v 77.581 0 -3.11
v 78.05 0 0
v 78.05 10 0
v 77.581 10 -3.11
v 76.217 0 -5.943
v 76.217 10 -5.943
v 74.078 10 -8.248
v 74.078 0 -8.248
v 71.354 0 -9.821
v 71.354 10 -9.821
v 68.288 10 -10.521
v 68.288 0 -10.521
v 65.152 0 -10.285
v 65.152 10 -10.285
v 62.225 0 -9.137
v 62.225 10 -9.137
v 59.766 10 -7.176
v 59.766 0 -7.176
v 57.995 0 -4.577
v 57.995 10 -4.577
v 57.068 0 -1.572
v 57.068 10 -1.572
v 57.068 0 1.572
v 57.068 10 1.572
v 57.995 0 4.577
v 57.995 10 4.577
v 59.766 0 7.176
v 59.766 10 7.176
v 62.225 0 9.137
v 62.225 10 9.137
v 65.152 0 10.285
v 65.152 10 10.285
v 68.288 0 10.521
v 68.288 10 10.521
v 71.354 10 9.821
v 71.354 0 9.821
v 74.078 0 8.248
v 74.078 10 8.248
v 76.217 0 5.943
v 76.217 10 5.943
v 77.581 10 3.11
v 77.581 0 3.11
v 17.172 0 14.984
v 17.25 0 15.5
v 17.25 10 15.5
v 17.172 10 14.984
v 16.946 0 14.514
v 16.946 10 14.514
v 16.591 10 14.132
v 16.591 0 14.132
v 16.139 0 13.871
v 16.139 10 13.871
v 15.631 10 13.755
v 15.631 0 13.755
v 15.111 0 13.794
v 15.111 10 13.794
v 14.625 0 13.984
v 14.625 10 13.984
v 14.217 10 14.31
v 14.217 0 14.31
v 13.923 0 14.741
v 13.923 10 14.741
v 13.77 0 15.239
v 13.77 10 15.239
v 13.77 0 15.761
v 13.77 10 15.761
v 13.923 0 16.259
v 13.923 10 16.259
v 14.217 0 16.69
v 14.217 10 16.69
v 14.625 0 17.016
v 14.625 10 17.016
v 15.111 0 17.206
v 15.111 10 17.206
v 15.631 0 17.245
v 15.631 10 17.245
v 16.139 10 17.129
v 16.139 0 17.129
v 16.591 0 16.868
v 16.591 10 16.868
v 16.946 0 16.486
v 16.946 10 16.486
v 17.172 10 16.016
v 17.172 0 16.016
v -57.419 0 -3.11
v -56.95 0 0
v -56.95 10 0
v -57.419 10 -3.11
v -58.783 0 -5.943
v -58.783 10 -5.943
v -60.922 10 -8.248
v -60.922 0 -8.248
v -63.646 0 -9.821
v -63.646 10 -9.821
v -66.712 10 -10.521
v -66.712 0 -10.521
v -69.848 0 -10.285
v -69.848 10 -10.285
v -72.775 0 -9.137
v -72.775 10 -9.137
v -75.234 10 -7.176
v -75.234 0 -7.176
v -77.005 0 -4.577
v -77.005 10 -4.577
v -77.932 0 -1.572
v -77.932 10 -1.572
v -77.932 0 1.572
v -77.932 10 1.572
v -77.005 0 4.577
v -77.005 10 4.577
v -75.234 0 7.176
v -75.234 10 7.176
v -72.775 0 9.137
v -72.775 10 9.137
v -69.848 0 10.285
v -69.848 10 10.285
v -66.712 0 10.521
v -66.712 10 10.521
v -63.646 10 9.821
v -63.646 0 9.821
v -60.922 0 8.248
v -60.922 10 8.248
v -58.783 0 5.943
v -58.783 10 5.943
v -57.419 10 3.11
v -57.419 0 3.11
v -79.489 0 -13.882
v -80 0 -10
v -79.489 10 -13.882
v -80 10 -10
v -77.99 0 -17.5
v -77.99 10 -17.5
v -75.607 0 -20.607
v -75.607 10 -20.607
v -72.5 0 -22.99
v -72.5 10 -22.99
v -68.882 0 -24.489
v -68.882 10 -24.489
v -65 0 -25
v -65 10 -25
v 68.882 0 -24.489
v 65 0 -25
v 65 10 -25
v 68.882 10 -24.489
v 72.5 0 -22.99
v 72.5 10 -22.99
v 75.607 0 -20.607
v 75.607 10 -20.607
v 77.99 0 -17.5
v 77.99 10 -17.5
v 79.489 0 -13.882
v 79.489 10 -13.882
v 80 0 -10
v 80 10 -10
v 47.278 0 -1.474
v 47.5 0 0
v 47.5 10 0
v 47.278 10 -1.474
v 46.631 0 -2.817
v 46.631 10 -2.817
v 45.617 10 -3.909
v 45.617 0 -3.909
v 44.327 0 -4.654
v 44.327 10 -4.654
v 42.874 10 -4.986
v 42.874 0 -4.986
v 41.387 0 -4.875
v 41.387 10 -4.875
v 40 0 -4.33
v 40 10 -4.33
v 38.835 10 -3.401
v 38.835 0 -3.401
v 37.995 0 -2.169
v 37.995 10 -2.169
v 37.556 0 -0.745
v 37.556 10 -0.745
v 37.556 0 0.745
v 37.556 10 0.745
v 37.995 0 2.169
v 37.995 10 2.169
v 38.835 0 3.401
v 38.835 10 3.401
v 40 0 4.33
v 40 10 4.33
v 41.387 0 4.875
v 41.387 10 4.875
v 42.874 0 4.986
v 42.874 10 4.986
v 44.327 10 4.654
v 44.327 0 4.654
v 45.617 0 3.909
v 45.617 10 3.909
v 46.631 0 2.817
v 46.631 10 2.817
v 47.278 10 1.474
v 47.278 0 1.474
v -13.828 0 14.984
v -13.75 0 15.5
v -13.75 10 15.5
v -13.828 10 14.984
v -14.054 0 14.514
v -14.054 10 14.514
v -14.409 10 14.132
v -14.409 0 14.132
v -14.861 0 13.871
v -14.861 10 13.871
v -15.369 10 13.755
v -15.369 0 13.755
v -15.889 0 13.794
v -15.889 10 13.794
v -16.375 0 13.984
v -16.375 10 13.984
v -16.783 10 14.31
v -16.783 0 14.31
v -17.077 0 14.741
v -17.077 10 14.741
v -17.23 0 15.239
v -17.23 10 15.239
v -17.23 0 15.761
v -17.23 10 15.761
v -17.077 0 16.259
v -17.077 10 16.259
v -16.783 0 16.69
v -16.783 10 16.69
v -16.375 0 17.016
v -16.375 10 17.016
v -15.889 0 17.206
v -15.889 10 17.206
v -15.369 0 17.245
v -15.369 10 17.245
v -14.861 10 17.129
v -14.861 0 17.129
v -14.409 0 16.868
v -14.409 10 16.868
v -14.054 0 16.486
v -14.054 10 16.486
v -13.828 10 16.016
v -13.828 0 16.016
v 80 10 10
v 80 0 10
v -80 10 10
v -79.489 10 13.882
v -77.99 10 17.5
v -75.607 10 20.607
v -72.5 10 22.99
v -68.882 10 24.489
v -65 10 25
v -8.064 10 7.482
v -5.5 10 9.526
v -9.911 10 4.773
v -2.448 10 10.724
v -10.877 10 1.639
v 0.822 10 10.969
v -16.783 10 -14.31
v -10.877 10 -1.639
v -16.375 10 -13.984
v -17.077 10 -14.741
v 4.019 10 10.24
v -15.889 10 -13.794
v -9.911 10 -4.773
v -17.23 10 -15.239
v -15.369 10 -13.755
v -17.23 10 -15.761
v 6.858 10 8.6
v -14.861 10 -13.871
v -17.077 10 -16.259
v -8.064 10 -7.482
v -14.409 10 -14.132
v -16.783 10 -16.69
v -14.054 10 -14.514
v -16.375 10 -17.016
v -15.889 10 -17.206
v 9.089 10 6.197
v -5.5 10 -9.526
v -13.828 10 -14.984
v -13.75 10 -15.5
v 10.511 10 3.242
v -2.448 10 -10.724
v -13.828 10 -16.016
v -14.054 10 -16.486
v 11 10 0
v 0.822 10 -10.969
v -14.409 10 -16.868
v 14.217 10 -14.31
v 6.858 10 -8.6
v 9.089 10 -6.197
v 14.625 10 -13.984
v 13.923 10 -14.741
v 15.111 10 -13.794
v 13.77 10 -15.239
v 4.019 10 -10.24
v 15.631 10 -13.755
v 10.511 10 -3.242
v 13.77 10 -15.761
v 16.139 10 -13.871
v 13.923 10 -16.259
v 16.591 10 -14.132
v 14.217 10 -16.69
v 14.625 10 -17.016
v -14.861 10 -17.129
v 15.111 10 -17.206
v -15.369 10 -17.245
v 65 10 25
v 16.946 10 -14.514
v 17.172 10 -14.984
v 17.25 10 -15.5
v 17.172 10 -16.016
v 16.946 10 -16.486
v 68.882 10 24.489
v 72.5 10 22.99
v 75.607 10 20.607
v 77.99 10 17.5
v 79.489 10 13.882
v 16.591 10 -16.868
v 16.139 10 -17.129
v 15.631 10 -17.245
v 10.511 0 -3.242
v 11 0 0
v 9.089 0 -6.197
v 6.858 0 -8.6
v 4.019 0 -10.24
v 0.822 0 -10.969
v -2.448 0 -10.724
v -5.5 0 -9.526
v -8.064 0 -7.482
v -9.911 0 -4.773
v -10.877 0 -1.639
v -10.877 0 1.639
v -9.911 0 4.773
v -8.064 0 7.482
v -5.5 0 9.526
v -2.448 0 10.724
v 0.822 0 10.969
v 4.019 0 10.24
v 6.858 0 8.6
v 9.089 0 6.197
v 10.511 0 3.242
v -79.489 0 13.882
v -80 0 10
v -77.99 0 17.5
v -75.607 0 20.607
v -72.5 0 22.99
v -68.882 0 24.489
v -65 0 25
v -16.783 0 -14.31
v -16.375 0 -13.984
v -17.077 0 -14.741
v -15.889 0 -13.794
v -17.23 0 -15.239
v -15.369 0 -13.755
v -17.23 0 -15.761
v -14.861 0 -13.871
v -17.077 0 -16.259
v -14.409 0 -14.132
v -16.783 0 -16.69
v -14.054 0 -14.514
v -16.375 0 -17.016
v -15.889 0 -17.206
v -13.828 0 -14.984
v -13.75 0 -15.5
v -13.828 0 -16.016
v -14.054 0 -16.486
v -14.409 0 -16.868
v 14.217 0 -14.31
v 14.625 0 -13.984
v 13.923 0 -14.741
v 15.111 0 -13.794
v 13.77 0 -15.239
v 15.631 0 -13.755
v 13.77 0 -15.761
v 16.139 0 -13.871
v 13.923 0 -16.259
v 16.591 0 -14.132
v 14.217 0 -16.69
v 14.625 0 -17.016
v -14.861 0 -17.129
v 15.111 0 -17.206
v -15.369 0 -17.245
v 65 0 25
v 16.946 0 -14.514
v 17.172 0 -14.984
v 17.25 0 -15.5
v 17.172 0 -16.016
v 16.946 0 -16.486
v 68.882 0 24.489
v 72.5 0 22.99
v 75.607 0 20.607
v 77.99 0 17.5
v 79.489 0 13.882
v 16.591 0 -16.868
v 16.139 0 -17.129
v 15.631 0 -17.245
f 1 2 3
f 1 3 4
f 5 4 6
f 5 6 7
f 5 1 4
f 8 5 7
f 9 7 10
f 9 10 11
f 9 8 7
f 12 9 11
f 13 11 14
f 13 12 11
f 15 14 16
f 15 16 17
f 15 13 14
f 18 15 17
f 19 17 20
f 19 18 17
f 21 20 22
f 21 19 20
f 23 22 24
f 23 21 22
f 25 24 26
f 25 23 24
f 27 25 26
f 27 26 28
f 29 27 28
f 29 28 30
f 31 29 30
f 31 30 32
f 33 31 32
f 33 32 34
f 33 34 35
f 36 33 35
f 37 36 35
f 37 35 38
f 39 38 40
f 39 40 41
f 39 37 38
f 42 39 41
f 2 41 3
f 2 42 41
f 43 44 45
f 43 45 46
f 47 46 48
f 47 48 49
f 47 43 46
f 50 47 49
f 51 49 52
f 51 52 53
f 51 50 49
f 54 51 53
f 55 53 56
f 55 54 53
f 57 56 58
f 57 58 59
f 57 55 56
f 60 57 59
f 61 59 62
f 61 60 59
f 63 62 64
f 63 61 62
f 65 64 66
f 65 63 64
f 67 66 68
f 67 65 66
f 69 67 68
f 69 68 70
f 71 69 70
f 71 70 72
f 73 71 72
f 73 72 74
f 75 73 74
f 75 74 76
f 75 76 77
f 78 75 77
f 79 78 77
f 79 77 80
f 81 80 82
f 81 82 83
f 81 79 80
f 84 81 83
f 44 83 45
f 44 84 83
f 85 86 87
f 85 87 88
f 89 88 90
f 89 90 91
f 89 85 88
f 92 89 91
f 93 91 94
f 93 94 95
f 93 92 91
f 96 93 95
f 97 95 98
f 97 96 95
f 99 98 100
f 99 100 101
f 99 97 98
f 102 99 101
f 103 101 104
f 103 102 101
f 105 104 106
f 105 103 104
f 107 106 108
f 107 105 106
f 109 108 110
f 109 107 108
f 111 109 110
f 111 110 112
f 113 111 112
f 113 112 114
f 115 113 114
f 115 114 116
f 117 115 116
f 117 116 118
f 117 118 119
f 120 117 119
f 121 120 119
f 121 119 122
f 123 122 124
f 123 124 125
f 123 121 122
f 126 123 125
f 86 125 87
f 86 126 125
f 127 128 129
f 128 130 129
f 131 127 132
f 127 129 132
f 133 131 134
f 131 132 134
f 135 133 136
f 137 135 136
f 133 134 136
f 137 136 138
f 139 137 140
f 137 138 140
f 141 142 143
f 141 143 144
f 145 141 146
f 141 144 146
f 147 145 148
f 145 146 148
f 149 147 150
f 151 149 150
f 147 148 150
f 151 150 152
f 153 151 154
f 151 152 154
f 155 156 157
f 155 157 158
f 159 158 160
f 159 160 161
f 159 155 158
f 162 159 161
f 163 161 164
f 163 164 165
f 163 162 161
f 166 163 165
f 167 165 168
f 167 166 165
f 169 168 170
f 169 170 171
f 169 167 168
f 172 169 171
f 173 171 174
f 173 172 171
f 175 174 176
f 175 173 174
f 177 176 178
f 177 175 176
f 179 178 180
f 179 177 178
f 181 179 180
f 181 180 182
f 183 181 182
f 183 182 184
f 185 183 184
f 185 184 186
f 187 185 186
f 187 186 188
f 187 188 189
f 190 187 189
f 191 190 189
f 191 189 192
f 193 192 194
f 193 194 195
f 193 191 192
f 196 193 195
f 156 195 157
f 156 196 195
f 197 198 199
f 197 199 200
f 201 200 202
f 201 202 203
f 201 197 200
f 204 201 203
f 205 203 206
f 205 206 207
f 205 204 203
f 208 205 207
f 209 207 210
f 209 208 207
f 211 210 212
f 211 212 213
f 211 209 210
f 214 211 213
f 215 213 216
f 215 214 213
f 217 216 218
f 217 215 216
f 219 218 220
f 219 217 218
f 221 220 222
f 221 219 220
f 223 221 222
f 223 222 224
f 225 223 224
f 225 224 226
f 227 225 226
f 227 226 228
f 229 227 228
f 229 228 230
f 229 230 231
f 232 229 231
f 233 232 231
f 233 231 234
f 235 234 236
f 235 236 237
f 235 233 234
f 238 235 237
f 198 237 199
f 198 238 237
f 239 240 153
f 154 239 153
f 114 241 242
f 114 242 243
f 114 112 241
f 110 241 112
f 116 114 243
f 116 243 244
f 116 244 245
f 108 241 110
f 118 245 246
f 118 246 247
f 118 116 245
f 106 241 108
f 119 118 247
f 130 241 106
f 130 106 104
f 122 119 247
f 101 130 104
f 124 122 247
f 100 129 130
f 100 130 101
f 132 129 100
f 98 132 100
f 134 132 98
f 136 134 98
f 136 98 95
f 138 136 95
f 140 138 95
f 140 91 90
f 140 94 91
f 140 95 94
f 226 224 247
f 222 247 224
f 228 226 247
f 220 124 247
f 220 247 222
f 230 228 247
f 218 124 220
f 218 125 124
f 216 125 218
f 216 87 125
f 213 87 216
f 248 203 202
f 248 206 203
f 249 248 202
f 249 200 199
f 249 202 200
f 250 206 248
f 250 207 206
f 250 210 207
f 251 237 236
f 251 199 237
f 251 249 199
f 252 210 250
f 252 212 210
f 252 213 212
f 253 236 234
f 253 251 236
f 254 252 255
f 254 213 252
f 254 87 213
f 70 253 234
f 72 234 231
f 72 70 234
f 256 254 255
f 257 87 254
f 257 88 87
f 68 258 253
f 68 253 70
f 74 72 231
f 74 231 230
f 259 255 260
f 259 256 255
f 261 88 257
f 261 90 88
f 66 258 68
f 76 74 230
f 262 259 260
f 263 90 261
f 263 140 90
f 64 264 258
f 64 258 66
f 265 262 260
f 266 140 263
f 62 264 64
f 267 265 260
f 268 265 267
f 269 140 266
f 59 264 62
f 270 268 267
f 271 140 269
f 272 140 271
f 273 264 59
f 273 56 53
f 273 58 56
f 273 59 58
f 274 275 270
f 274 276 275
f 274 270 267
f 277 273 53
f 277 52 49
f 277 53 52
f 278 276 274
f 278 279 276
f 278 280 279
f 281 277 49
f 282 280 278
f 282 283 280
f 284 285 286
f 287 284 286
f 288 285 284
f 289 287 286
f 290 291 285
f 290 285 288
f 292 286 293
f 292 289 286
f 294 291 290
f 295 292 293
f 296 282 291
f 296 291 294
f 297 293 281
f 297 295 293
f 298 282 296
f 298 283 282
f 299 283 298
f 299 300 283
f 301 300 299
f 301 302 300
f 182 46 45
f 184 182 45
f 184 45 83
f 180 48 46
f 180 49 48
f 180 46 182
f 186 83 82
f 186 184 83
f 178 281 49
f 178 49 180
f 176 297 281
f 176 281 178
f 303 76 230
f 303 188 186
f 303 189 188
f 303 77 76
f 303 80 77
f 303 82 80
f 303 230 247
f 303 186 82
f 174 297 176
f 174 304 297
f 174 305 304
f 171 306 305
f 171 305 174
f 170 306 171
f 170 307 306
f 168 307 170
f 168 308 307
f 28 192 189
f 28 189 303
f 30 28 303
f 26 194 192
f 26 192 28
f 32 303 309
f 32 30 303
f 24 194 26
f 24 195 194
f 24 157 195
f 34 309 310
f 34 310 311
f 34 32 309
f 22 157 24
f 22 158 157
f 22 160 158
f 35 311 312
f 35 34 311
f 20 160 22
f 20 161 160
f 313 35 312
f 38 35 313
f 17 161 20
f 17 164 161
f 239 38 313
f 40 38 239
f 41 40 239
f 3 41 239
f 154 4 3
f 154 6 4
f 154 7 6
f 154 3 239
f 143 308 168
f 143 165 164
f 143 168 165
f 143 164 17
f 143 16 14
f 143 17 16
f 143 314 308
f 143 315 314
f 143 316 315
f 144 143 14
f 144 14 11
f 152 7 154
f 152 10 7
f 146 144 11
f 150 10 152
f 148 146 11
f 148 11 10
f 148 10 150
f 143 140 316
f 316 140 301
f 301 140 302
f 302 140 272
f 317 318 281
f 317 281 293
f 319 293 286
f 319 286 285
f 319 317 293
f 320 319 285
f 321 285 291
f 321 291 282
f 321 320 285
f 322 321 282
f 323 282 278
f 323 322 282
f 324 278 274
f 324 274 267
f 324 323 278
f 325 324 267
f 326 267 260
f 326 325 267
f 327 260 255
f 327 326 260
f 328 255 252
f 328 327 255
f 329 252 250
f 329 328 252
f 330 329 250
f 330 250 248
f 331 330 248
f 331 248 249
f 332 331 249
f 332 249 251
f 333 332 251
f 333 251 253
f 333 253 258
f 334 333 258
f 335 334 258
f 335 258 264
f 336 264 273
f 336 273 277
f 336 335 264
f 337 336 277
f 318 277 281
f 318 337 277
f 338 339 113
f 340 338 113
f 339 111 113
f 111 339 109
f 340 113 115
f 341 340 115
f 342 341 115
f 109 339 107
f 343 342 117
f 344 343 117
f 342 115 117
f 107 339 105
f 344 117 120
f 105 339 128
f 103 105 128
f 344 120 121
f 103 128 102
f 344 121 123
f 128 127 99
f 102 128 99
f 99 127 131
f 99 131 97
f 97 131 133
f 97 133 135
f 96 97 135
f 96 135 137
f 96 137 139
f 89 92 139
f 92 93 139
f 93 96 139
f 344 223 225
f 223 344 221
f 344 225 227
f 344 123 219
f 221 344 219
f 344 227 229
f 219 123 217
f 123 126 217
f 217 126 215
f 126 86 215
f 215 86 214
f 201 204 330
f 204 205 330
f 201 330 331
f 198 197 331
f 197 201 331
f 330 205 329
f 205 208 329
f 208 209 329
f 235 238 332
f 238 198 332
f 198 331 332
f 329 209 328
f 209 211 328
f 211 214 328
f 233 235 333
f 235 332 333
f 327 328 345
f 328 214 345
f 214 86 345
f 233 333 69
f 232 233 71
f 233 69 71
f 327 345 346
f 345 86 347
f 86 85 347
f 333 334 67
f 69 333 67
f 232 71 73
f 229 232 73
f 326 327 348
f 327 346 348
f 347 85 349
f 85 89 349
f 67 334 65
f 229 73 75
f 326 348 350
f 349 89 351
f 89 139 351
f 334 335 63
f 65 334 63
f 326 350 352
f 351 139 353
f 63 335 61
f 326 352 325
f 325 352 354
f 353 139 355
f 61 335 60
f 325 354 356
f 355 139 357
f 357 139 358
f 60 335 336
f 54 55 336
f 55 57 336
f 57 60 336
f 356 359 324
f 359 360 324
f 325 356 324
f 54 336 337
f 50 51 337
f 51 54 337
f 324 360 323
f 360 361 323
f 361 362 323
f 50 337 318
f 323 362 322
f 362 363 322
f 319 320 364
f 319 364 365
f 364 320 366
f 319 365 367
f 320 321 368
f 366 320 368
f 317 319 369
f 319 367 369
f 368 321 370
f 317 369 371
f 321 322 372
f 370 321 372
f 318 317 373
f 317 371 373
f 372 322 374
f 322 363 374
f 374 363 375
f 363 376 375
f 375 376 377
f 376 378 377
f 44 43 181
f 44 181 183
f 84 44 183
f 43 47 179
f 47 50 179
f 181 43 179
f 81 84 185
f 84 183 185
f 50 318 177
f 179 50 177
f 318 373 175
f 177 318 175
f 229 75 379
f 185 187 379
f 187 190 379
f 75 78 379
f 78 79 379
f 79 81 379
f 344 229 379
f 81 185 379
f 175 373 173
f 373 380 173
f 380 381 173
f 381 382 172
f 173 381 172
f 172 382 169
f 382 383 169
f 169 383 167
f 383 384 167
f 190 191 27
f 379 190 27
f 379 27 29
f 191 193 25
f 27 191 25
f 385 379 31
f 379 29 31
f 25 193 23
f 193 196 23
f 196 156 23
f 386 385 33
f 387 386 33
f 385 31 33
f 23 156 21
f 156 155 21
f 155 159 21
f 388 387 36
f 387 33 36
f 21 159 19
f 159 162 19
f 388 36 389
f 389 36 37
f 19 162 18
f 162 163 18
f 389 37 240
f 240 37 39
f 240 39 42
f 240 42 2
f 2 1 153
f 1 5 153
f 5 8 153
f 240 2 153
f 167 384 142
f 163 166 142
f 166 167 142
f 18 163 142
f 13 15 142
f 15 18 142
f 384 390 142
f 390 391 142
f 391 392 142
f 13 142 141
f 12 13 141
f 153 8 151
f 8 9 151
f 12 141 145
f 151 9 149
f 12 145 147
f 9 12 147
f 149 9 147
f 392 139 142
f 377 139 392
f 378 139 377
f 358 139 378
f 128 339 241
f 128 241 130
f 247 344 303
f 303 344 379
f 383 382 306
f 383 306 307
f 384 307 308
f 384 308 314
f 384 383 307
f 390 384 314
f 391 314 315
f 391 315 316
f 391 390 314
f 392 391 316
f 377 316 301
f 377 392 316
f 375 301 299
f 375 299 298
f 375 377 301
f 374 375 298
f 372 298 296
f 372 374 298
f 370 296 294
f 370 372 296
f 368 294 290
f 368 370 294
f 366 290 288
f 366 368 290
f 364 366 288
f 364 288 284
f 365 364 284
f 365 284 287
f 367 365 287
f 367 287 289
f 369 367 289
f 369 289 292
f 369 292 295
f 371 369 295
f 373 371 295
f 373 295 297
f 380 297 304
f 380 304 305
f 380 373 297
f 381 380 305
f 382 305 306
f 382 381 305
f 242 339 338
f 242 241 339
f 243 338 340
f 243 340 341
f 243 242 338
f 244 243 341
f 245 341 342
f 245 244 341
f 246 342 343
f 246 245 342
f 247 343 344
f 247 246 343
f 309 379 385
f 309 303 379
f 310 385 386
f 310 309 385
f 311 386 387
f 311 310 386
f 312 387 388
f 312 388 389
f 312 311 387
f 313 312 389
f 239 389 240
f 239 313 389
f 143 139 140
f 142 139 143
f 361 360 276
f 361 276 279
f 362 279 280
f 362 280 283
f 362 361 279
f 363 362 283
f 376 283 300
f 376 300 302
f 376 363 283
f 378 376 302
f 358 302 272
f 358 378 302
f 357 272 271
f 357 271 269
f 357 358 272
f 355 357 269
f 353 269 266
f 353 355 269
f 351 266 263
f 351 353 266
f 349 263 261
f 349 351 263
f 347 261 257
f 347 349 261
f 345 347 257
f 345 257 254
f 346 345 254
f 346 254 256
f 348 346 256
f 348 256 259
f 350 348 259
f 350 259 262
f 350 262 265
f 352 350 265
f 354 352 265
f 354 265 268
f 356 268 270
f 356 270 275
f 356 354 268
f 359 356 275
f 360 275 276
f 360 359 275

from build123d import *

# Parameters (mm, degrees)
SKETCH1_W           = 160
SKETCH1_H           = 50
SKETCH1_R           = 11
SKETCH1_R_2         = 1.75
SKETCH1_R_3         = 10.55
SKETCH1_R_4         = 5
BOSS_EXTRUDE1_DEPTH = 10
FILLET1_R           = 15


with BuildPart() as part:
    # Sketch1 → Boss-Extrude1 (new body)
    with BuildSketch(Plane(origin=(0, 0, 0), x_dir=(1, 0, 0), z_dir=(0, 1, 0))):
        Rectangle(SKETCH1_W, SKETCH1_H)
        Circle(SKETCH1_R, mode=Mode.SUBTRACT)
        with Locations((15.5, 15.5)):
            Circle(SKETCH1_R_2, mode=Mode.SUBTRACT)
        with Locations((-15.5, 15.5)):
            Circle(SKETCH1_R_2, mode=Mode.SUBTRACT)
        with Locations((-15.5, -15.5)):
            Circle(SKETCH1_R_2, mode=Mode.SUBTRACT)
        with Locations((15.5, -15.5)):
            Circle(SKETCH1_R_2, mode=Mode.SUBTRACT)
        with Locations((-67.5, 0)):
            Circle(SKETCH1_R_3, mode=Mode.SUBTRACT)
        with Locations((67.5, 0)):
            Circle(SKETCH1_R_3, mode=Mode.SUBTRACT)
        with Locations((42.5, 0)):
            Circle(SKETCH1_R_4, mode=Mode.SUBTRACT)
    extrude(amount=BOSS_EXTRUDE1_DEPTH)

    # Fillet1
    fillet1_edges = [part.edges().sort_by_distance(p)[0] for p in [
        (80, 5, 25),
        (-80, 5, 25),
        (-80, 5, -25),
        (80, 5, -25),
    ]]
    fillet(fillet1_edges, radius=FILLET1_R)


solid = part.part
